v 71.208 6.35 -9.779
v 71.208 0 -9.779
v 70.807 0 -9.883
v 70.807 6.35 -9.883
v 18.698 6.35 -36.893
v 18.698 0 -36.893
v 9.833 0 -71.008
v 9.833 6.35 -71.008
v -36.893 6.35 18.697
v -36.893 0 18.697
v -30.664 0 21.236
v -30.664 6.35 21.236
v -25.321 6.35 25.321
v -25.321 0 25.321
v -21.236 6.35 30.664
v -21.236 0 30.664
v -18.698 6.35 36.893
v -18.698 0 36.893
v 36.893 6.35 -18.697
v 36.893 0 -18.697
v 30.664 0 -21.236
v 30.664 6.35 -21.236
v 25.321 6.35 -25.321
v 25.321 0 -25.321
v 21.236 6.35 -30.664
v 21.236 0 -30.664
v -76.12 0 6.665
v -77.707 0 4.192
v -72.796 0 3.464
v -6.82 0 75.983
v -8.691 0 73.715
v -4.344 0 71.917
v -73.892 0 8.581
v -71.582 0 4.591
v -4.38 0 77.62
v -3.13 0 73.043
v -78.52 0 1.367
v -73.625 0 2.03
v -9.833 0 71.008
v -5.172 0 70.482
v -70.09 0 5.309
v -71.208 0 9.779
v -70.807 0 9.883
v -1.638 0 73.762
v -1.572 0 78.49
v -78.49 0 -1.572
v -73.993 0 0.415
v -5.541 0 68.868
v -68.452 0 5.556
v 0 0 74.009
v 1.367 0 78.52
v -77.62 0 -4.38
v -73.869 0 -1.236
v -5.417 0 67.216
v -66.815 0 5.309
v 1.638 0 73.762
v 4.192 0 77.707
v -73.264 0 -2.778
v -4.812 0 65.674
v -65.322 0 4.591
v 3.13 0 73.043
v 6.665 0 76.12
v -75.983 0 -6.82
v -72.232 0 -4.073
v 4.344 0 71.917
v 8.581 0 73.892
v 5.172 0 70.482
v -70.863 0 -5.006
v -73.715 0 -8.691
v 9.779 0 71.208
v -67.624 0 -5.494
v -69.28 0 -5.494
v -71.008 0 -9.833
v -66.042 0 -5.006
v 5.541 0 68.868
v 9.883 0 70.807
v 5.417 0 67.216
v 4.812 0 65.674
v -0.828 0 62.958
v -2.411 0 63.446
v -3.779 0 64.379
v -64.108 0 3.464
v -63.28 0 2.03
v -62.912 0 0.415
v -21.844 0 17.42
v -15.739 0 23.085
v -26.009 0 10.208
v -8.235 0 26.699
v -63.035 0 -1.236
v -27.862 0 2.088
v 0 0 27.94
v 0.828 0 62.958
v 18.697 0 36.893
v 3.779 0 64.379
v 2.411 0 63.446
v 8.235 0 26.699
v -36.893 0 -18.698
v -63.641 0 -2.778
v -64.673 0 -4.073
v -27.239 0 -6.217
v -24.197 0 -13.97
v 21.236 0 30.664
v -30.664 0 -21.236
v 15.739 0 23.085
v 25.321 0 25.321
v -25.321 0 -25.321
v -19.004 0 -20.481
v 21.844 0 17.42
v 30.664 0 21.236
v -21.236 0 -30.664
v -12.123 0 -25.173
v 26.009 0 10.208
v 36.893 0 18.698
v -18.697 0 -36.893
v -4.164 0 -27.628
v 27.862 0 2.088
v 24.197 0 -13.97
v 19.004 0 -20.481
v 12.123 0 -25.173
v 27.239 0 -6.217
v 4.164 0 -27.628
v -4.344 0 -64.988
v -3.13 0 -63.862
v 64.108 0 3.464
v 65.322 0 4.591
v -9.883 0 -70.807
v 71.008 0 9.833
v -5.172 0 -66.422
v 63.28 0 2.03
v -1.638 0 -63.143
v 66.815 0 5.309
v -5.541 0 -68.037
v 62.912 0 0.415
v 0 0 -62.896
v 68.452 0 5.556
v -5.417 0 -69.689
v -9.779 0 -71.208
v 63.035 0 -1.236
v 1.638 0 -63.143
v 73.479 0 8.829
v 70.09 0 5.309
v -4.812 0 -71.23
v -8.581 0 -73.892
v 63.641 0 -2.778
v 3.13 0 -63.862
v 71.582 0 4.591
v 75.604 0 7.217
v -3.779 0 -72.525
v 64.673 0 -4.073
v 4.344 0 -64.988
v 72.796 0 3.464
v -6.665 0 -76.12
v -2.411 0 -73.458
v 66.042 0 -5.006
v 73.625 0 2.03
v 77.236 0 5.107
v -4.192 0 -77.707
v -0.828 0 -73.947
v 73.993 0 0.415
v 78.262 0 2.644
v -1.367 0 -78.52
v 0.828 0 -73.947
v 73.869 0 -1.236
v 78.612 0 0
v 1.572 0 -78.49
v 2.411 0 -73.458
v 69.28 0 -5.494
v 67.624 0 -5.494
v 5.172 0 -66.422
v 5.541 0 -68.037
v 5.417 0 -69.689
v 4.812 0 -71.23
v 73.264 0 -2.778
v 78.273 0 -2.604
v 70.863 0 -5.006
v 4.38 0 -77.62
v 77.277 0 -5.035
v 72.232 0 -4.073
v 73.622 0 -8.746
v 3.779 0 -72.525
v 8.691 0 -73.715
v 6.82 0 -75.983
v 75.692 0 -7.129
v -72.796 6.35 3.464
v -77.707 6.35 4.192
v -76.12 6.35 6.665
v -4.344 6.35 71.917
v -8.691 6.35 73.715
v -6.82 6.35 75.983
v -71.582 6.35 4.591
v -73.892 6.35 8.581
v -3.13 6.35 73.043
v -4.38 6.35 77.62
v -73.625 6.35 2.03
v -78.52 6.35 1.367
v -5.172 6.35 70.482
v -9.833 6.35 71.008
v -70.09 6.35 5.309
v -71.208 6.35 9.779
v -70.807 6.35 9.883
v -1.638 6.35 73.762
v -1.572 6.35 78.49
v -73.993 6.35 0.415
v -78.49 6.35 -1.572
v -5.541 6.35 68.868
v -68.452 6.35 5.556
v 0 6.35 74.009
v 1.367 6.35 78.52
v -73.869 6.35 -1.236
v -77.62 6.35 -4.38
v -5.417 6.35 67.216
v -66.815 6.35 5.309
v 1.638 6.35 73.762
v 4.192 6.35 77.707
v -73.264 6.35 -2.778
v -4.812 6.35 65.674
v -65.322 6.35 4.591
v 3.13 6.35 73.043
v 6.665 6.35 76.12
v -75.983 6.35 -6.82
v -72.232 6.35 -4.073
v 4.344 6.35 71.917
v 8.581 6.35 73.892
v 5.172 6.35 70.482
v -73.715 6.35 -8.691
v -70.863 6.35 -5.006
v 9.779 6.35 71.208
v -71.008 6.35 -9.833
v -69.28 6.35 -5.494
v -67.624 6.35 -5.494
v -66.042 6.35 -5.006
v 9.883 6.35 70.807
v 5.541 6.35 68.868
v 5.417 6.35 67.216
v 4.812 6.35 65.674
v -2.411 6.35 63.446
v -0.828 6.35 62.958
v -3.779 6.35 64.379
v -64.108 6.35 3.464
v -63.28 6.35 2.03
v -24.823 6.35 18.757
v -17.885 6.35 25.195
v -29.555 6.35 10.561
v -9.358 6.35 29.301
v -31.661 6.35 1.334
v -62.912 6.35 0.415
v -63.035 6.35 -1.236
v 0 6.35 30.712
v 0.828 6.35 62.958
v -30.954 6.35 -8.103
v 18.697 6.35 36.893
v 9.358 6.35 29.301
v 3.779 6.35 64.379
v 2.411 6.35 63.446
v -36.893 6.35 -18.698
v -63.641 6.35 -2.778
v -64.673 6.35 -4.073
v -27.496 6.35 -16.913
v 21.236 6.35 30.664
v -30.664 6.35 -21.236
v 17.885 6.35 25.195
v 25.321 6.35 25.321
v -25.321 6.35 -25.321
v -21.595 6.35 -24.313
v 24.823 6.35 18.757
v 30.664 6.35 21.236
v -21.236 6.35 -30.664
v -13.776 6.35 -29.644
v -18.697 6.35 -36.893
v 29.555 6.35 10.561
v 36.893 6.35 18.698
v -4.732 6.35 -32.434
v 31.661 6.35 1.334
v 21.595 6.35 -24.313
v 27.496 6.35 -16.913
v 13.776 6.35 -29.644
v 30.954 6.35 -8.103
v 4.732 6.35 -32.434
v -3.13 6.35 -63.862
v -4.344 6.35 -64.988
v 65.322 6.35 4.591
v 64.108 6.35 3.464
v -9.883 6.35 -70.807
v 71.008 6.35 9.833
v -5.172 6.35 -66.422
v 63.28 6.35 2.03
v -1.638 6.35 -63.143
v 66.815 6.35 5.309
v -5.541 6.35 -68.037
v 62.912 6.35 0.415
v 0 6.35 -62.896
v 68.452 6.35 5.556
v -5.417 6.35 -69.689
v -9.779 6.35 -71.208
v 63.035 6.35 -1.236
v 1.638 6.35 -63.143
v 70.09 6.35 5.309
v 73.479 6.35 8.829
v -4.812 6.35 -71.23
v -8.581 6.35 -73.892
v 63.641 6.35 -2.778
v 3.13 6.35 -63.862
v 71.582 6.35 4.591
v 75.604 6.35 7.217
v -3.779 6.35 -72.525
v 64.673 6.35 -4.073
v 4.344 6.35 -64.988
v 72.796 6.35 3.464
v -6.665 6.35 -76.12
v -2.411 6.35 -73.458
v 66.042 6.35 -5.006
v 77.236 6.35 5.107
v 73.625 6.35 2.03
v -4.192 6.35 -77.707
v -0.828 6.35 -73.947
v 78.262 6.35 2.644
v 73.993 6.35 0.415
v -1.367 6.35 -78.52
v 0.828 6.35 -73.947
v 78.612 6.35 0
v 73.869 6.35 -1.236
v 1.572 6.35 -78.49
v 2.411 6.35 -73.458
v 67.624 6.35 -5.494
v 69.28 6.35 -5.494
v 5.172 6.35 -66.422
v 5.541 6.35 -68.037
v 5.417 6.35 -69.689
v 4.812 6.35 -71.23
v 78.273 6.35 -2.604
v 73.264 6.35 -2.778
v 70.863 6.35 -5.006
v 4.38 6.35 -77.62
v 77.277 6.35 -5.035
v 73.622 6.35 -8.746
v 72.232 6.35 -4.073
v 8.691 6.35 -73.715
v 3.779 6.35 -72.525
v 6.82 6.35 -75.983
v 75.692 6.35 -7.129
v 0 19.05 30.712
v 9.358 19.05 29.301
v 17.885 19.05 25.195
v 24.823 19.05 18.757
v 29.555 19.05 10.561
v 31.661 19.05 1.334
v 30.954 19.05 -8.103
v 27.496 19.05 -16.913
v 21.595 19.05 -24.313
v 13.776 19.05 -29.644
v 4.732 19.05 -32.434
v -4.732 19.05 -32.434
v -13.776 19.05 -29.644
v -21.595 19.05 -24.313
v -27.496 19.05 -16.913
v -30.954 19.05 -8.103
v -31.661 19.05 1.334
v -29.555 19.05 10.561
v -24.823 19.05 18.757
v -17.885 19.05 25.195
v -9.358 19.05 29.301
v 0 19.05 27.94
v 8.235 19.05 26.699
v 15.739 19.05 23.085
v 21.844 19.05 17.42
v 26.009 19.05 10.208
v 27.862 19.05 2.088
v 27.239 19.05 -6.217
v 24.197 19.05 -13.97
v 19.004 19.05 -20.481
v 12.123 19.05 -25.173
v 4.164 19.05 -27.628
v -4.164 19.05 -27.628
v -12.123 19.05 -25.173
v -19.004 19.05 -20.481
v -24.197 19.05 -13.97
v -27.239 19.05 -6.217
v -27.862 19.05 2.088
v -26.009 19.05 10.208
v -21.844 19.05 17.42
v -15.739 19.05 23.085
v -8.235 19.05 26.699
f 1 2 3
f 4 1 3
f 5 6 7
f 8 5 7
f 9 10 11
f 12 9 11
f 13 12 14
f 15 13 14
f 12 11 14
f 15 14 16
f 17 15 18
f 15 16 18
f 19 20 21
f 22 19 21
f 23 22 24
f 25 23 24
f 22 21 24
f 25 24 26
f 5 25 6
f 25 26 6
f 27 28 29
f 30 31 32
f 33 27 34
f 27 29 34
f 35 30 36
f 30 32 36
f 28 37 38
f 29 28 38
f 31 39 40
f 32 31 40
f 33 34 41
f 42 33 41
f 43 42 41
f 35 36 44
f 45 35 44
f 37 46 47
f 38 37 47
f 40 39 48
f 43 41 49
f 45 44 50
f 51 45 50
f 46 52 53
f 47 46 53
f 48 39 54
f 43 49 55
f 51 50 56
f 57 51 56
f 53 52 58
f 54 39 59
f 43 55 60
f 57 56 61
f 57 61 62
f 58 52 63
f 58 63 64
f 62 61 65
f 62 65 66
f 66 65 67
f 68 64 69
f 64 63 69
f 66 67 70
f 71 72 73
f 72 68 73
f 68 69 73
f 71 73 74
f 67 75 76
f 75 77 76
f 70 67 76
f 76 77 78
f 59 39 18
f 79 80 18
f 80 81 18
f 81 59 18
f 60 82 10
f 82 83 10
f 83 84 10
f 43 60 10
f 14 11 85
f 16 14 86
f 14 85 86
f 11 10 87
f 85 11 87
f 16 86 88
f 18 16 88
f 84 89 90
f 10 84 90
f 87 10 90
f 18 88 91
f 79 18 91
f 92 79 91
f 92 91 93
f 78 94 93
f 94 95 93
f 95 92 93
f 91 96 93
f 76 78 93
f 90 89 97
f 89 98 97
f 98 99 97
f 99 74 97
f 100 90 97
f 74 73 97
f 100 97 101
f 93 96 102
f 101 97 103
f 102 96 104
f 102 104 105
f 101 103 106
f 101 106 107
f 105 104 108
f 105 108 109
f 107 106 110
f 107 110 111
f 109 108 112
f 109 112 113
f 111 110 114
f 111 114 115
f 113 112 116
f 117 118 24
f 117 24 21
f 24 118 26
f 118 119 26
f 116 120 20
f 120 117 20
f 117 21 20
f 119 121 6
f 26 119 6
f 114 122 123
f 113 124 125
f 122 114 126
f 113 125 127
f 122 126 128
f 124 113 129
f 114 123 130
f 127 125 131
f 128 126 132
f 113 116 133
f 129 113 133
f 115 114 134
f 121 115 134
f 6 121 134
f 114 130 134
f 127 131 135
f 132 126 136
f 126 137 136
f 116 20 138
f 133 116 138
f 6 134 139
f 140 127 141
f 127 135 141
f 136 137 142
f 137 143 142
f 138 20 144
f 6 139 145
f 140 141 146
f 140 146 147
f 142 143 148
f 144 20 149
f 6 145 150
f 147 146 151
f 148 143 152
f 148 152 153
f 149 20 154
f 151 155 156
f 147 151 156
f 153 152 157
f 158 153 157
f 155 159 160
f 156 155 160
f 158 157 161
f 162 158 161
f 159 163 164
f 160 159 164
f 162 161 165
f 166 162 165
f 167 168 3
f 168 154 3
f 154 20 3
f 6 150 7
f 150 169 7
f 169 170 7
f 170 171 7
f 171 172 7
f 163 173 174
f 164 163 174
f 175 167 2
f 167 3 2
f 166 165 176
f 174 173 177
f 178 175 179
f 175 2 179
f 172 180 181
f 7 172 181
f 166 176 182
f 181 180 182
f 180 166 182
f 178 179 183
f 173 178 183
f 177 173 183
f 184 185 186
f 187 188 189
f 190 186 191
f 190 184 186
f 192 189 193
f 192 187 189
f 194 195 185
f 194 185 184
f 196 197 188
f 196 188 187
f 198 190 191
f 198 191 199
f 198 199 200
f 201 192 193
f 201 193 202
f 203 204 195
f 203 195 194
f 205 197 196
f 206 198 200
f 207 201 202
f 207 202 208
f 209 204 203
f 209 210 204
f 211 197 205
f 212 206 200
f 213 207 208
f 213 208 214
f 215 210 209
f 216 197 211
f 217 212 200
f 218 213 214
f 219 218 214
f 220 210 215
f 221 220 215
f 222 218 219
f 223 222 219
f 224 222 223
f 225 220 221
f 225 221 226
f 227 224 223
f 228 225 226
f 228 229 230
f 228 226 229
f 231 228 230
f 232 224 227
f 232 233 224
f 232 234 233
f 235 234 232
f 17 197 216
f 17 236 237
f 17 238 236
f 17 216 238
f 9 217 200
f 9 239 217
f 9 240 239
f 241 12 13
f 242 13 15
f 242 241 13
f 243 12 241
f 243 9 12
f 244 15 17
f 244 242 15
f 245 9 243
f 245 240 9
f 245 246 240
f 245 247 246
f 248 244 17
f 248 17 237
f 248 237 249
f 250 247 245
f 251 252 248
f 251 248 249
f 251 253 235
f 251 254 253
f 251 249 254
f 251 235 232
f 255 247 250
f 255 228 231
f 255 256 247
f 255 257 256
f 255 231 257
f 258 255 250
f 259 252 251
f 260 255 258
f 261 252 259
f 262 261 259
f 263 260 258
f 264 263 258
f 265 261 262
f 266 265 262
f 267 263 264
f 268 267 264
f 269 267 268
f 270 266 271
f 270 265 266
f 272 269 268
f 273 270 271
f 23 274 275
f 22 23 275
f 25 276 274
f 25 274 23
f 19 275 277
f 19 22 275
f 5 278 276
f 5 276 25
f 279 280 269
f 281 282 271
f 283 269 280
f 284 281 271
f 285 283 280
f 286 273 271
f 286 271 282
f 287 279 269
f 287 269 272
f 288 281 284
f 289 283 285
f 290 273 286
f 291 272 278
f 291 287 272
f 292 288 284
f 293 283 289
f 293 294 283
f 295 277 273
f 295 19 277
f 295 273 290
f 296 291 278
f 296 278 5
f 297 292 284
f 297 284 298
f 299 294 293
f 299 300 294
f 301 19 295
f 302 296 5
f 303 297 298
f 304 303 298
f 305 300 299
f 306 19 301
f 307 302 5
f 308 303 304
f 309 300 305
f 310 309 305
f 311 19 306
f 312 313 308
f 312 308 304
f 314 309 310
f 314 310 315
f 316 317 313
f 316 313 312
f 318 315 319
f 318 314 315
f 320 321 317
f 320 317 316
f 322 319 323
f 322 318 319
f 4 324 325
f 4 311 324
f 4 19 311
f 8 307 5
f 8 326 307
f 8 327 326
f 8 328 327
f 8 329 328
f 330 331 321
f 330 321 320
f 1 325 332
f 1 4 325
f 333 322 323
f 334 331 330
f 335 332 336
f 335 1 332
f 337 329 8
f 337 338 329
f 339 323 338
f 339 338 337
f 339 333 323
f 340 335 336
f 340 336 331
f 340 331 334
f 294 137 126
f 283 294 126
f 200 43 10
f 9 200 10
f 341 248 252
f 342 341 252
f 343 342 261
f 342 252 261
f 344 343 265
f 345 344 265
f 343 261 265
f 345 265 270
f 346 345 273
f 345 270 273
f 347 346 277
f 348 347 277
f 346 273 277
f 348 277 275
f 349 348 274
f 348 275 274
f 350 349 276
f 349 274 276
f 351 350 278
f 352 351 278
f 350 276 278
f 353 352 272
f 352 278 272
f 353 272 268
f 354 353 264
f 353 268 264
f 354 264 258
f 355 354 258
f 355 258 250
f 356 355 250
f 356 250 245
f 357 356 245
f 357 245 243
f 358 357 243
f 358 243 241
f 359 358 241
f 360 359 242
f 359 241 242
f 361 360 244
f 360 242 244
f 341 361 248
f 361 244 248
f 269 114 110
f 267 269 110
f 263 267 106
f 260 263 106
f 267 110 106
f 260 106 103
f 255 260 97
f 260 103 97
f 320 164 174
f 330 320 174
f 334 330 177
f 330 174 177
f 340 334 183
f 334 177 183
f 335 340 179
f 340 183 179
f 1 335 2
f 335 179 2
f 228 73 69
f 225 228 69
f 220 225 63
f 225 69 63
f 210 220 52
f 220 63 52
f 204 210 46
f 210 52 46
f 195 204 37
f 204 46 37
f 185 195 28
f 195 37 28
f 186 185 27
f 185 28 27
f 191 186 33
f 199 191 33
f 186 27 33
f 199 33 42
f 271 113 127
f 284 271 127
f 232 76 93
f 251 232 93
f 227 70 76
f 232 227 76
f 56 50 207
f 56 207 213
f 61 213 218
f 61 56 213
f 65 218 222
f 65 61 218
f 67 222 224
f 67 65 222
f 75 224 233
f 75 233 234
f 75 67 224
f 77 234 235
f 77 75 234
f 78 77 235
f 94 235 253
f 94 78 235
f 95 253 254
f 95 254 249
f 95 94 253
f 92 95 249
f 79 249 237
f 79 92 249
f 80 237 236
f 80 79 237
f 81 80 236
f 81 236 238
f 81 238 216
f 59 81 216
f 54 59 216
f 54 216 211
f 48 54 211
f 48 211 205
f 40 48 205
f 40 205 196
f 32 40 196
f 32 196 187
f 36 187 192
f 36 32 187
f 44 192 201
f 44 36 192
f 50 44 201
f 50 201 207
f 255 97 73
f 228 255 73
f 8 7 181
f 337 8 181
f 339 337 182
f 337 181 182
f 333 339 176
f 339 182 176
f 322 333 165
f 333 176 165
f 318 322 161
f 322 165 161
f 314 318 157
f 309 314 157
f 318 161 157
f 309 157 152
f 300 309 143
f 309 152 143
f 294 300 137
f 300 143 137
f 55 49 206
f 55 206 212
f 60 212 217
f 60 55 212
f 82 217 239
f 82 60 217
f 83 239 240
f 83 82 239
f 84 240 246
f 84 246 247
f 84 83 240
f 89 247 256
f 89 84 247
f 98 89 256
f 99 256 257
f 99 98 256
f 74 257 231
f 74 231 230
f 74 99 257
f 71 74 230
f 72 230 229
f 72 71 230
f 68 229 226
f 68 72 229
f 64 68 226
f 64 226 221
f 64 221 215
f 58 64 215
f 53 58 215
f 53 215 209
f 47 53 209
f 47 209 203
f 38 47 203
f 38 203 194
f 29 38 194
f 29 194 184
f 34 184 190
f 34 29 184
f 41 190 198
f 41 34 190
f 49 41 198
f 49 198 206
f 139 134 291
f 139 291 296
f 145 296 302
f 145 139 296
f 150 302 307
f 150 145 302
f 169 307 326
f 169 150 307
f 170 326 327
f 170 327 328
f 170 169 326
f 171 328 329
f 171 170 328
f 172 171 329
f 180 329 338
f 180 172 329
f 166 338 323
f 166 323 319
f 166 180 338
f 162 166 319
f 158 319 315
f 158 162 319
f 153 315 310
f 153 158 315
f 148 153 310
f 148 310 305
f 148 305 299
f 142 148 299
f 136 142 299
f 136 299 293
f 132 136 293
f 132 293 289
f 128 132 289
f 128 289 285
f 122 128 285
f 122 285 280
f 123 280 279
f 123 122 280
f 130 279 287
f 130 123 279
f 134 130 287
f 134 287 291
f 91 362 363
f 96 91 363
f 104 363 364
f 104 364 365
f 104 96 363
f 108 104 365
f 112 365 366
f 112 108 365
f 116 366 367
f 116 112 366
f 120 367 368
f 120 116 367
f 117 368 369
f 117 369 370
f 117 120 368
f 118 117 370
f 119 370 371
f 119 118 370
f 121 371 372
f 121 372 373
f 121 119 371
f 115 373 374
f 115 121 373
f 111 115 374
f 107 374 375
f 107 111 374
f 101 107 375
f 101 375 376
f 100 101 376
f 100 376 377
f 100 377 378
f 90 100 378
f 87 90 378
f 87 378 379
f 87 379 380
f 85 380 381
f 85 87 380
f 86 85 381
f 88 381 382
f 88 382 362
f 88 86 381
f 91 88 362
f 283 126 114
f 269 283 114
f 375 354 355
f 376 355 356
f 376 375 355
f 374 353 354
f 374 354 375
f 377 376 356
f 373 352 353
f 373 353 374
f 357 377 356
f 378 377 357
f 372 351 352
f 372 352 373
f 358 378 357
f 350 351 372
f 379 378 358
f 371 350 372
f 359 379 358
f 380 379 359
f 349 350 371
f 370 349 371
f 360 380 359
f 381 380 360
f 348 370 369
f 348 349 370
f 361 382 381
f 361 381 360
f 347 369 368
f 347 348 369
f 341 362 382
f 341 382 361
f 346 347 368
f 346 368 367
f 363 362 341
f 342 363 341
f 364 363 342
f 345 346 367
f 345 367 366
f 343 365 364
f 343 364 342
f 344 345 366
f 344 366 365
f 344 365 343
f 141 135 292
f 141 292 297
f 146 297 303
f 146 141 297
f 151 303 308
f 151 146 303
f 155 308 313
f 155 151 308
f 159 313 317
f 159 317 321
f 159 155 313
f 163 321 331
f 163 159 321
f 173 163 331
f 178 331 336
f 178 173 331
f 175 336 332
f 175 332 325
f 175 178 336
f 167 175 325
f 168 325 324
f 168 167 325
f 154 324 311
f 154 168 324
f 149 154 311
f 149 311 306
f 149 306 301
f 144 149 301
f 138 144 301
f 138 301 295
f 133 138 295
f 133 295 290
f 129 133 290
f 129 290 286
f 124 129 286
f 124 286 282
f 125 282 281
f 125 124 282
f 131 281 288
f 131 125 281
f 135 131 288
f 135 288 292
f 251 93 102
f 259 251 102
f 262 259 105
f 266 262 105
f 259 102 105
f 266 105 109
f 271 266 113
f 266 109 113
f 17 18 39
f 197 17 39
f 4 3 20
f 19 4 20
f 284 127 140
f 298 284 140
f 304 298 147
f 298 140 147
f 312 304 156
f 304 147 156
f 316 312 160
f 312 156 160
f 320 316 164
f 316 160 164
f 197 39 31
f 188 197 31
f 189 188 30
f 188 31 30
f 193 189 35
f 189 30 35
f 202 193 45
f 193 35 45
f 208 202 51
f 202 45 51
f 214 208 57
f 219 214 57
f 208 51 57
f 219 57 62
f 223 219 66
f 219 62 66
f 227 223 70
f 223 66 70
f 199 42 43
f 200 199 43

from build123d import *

# Parameters (mm, degrees)
SKETCH1_R           = 5.55625
SKETCH1_R_2         = 31.75
SKETCH1_R_3         = 27.94
BOSS_EXTRUDE1_DEPTH = 6.35
SKETCH2_R           = 31.75
SKETCH2_R_2         = 27.94
BOSS_EXTRUDE2_DEPTH = 12.7


with BuildPart() as part:
    # Sketch1 → Boss-Extrude1 (new body)
    # profile 1 of 6: a face of its own
    with BuildSketch(Plane(origin=(0, 0, 0), x_dir=(1, 0, 0), z_dir=(0, 1, 0))):
        with BuildLine():
            ThreePointArc((-58.292365076, 0), (-62.236852489, 8.036977248), (-71.007523203, 9.833451426))
            ThreePointArc((-71.007523203, 9.833451426), (-78.611836011, 0.103683747), (-71.207683119, -9.7792547))
            Line((-71.207683119, -9.7792547), (-70.807129229, -9.883353974))
            ThreePointArc((-70.807129229, -9.883353974), (-62.155492987, -7.973393374), (-58.292365076, 0))
        make_face()
        with Locations(Location((-68.452365076, 0, 0), (0, 0, 270))):
            Circle(SKETCH1_R, mode=Mode.SUBTRACT)
    # profile 2 of 6: a face of its own
    with BuildSketch(Plane(origin=(0, 0, 0), x_dir=(1, 0, 0), z_dir=(0, 1, 0))):
        with BuildLine():
            Line((-9.883353974, 70.807129229), (-18.697333242, 36.892640474))
            ThreePointArc((-18.697333242, 36.892640474), (-25.320558446, 25.320679007), (-36.892798129, 18.697939919))
            Line((-36.892798129, 18.697939919), (-71.007523203, 9.833451426))
            ThreePointArc((-71.007523203, 9.833451426), (-62.236852489, 8.036977248), (-58.292365076, 0))
            ThreePointArc((-58.292365076, 0), (-62.155492987, -7.973393374), (-70.807129229, -9.883353974))
            Line((-70.807129229, -9.883353974), (-36.892640474, -18.697333242))
            ThreePointArc((-36.892640474, -18.697333242), (-25.320679007, -25.320558446), (-18.697939919, -36.892798129))
            Line((-18.697939919, -36.892798129), (-9.833451426, -71.007523203))
            ThreePointArc((-9.833451426, -71.007523203), (-1.287970014, -58.374332865), (10.16, -68.452365076))
            ThreePointArc((10.16, -68.452365076), (10.090601478, -69.637844646), (9.883353974, -70.807129229))
            Line((9.883353974, -70.807129229), (18.697333242, -36.892640474))
            ThreePointArc((18.697333242, -36.892640474), (25.320558446, -25.320679007), (36.892798129, -18.697939919))
            Line((36.892798129, -18.697939919), (71.007523203, -9.833451426))
            ThreePointArc((71.007523203, -9.833451426), (58.292889794, -0.103256972), (70.807129229, 9.883353974))
            Line((70.807129229, 9.883353974), (36.892640474, 18.697333242))
            ThreePointArc((36.892640474, 18.697333242), (25.320679007, 25.320558446), (18.697939919, 36.892798129))
            Line((18.697939919, 36.892798129), (9.833451426, 71.007523203))
            ThreePointArc((9.833451426, 71.007523203), (10.078032211, 69.74033509), (10.16, 68.452365076))
            ThreePointArc((10.16, 68.452365076), (-1.18547957, 58.361763598), (-9.883353974, 70.807129229))
        make_face()
        Circle(SKETCH1_R_2, mode=Mode.SUBTRACT)
    # profile 3 of 6: a face of its own
    with BuildSketch(Plane(origin=(0, 0, 0), x_dir=(1, 0, 0), z_dir=(0, 1, 0))):
        with BuildLine():
            ThreePointArc((10.16, -68.452365076), (-1.287970014, -58.374332865), (-9.833451426, -71.007523203))
            ThreePointArc((-9.833451426, -71.007523203), (-0.103683747, -78.611836011), (9.7792547, -71.207683119))
            Line((9.7792547, -71.207683119), (9.883353974, -70.807129229))
            ThreePointArc((9.883353974, -70.807129229), (10.090601478, -69.637844646), (10.16, -68.452365076))
        make_face()
        with Locations(Location((0, -68.452365076, 0), (0, 0, 270))):
            Circle(SKETCH1_R, mode=Mode.SUBTRACT)
    # profile 4 of 6: a face of its own
    with BuildSketch(Plane(origin=(0, 0, 0), x_dir=(1, 0, 0), z_dir=(0, 1, 0))):
        with BuildLine():
            Line((-9.7792547, 71.207683119), (-9.883353974, 70.807129229))
            ThreePointArc((-9.883353974, 70.807129229), (-1.18547957, 58.361763598), (10.16, 68.452365076))
            ThreePointArc((10.16, 68.452365076), (10.078032211, 69.74033509), (9.833451426, 71.007523203))
            ThreePointArc((9.833451426, 71.007523203), (0.103683747, 78.611836011), (-9.7792547, 71.207683119))
        make_face()
        with Locations(Location((0, 68.452365076, 0), (0, 0, 270))):
            Circle(SKETCH1_R, mode=Mode.SUBTRACT)
    # profile 5 of 6: a face of its own
    with BuildSketch(Plane(origin=(0, 0, 0), x_dir=(1, 0, 0), z_dir=(0, 1, 0))):
        with BuildLine():
            Line((71.207683119, 9.7792547), (70.807129229, 9.883353974))
            ThreePointArc((70.807129229, 9.883353974), (58.292889794, -0.103256972), (71.007523203, -9.833451426))
            ThreePointArc((71.007523203, -9.833451426), (76.489342324, -6.215512587), (78.612365076, 0))
            ThreePointArc((78.612365076, 0), (76.552353697, 6.133170823), (71.207683119, 9.7792547))
        make_face()
        with Locations(Location((68.452365076, 0, 0), (0, 0, 270))):
            Circle(SKETCH1_R, mode=Mode.SUBTRACT)
    # profile 6 of 6: a face of its own
    with BuildSketch(Plane(origin=(0, 0, 0), x_dir=(1, 0, 0), z_dir=(0, 1, 0))):
        Circle(SKETCH1_R_2)
        with Locations(Location((0, 0, 0), (0, 0, 270))):
            Circle(SKETCH1_R_3, mode=Mode.SUBTRACT)
    extrude(amount=BOSS_EXTRUDE1_DEPTH)

    # Sketch2 → Boss-Extrude2 (add)
    with BuildSketch(Plane(origin=(0, 6.35, 0), x_dir=(1, 0, 0), z_dir=(0, 1, 0))):
        with Locations(Location((0, 1.038430884, 0), (0, 0, 270))):
            Circle(SKETCH2_R)
        with Locations(Location((0, 0, 0), (0, 0, 270))):
            Circle(SKETCH2_R_2, mode=Mode.SUBTRACT)
    extrude(amount=BOSS_EXTRUDE2_DEPTH)


solid = part.part
